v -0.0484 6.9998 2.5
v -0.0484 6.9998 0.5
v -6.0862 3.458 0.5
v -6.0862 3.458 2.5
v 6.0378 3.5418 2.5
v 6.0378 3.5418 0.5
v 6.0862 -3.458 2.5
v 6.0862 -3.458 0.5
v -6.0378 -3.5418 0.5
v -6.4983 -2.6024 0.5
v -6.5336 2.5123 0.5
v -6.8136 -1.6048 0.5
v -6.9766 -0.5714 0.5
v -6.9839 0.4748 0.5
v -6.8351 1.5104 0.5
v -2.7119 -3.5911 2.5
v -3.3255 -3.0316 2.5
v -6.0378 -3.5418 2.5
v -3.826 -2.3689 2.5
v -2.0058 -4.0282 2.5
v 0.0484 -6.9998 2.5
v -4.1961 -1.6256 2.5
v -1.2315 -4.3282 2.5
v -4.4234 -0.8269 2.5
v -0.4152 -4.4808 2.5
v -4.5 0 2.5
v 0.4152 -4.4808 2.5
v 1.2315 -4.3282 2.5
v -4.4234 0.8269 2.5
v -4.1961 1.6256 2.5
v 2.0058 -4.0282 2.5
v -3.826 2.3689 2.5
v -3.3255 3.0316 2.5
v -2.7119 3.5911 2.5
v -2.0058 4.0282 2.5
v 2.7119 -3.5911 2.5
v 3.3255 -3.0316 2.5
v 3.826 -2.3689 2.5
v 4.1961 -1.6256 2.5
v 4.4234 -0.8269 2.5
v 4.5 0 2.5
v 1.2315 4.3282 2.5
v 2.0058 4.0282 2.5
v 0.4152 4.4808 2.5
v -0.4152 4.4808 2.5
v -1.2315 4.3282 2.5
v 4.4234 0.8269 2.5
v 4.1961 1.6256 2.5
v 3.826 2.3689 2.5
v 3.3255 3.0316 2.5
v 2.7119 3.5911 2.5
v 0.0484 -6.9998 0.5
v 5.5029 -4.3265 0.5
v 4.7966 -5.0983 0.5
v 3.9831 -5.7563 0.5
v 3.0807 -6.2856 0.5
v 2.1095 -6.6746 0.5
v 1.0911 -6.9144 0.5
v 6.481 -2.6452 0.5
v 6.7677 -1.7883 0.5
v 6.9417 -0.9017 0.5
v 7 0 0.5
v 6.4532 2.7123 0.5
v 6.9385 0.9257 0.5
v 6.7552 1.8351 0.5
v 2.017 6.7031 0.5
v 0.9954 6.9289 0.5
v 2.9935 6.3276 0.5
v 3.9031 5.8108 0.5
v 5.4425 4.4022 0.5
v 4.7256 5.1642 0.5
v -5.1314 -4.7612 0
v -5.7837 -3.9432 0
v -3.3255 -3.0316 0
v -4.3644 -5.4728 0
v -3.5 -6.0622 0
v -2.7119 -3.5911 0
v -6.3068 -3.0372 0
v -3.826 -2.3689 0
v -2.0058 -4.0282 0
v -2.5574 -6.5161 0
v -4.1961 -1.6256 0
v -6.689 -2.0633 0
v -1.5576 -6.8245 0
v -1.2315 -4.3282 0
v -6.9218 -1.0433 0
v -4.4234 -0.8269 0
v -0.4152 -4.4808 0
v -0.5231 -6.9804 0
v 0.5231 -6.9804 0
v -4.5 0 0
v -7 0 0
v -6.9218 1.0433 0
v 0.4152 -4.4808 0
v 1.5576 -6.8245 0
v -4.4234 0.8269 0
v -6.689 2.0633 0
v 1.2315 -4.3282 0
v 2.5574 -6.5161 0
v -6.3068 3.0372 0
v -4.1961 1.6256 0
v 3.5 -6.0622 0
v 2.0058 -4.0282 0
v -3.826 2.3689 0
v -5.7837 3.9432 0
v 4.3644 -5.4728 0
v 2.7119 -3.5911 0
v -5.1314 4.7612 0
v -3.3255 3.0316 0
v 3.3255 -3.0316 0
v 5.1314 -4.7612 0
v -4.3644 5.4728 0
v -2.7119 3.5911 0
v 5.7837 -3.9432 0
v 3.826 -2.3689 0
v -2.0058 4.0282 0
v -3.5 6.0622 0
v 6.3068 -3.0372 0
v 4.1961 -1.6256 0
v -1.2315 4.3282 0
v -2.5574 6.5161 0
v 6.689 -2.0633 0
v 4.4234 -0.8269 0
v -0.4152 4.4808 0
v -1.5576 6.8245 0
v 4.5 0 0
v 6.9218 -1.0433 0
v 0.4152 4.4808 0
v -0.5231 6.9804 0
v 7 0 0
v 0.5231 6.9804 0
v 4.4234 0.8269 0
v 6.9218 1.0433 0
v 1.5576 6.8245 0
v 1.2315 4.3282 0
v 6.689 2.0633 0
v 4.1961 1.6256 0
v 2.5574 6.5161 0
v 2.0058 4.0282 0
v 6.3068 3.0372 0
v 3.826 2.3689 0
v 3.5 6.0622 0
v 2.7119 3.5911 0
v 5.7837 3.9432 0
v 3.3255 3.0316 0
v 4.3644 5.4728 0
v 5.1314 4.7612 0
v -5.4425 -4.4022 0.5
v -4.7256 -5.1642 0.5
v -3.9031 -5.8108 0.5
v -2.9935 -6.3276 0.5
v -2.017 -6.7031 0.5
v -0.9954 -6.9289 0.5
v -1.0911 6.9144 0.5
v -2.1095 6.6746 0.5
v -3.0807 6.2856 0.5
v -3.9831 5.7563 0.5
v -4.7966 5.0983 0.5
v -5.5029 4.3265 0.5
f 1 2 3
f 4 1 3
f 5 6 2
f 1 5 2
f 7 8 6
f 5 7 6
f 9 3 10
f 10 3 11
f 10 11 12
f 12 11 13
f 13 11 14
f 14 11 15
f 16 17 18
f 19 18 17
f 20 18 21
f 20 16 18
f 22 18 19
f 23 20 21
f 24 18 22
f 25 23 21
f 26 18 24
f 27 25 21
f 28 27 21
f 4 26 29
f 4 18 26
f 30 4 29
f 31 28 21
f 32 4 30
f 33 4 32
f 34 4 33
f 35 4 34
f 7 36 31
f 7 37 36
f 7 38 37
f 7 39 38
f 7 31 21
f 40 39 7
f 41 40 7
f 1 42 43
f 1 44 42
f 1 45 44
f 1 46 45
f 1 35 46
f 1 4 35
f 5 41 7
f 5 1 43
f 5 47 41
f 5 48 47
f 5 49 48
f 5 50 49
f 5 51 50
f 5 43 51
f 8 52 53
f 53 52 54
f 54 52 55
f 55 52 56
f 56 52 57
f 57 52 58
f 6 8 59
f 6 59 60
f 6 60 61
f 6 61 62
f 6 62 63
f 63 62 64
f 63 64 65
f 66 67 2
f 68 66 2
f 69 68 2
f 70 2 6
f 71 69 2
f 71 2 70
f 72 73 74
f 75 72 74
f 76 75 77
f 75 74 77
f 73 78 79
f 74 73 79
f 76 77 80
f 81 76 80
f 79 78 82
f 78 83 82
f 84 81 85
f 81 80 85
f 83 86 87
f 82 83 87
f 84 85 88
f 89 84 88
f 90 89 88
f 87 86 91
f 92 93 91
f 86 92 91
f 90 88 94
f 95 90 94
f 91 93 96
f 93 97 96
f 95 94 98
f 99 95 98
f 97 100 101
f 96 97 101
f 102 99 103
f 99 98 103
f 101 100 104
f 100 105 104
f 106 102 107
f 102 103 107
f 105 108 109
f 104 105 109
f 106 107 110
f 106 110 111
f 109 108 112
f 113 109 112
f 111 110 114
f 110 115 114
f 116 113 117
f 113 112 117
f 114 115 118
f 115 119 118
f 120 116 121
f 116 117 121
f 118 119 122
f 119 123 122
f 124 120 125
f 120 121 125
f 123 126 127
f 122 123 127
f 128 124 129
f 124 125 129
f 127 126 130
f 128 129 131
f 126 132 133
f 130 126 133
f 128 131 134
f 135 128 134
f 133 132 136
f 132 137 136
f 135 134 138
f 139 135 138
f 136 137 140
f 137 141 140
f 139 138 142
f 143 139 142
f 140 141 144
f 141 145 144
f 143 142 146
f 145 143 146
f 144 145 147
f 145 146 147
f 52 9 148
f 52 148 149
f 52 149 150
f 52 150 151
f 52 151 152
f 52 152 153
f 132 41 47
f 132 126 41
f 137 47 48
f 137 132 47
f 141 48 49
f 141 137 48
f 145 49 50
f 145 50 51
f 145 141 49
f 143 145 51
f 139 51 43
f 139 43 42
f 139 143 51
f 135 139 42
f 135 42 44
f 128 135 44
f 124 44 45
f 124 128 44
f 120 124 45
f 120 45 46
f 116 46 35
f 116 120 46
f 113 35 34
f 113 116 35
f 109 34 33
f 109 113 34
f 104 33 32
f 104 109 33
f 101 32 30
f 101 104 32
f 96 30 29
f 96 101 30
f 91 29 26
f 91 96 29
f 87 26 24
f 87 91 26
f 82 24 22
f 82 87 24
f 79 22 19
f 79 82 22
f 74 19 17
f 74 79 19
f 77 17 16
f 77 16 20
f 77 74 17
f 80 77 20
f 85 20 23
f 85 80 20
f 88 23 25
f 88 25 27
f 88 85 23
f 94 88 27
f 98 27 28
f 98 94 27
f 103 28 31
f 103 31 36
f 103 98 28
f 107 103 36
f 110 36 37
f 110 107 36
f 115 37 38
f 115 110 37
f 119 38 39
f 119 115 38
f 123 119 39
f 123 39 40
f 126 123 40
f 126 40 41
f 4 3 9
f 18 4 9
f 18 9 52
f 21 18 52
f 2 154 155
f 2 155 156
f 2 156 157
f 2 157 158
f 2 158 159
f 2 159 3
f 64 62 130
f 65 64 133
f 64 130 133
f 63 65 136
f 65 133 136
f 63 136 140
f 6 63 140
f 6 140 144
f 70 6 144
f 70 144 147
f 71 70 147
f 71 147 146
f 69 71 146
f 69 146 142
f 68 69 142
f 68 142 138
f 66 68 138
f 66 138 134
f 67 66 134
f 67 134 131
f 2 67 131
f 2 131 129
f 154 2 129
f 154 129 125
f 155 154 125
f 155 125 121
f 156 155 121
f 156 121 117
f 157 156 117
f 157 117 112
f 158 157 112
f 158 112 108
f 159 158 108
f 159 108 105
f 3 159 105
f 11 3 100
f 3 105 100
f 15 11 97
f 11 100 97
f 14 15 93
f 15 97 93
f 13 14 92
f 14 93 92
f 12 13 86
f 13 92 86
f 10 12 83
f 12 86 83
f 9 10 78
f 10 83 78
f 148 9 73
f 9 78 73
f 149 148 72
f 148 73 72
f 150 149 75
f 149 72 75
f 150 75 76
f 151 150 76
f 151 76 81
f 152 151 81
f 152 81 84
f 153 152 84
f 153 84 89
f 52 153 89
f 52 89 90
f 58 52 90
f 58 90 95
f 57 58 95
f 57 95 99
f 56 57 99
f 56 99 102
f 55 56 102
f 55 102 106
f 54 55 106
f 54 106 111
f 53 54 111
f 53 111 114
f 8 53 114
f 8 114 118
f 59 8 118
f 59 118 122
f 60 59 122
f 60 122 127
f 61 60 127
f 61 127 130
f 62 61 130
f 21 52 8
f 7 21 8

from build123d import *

# Parameters (mm, degrees)
ESQUISSE1_R        = 7
ESQUISSE1_R_2      = 4.5
BOSS_EXTRU_1_DEPTH = 0.5
ESQUISSE2_R        = 4.5
BOSS_EXTRU_2_DEPTH = 2


with BuildPart() as part:
    # Esquisse1 → Boss.-Extru.1 (new body)
    with BuildSketch(Plane.XY):
        Circle(ESQUISSE1_R)
        Circle(ESQUISSE1_R_2, mode=Mode.SUBTRACT)
    extrude(amount=BOSS_EXTRU_1_DEPTH)

    # Esquisse2 → Boss.-Extru.2 (add)
    with BuildSketch(Plane.XY.offset(0.5)):
        Polygon((6.086240364, -3.457987599), (6.037825289, 3.541844969), (-0.048415075, 6.999832568), (-6.086240364, 3.457987599), (-6.037825289, -3.541844969), (0.048415075, -6.999832568), align=None)
        Circle(ESQUISSE2_R, mode=Mode.SUBTRACT)
    extrude(amount=BOSS_EXTRU_2_DEPTH)


solid = part.part
